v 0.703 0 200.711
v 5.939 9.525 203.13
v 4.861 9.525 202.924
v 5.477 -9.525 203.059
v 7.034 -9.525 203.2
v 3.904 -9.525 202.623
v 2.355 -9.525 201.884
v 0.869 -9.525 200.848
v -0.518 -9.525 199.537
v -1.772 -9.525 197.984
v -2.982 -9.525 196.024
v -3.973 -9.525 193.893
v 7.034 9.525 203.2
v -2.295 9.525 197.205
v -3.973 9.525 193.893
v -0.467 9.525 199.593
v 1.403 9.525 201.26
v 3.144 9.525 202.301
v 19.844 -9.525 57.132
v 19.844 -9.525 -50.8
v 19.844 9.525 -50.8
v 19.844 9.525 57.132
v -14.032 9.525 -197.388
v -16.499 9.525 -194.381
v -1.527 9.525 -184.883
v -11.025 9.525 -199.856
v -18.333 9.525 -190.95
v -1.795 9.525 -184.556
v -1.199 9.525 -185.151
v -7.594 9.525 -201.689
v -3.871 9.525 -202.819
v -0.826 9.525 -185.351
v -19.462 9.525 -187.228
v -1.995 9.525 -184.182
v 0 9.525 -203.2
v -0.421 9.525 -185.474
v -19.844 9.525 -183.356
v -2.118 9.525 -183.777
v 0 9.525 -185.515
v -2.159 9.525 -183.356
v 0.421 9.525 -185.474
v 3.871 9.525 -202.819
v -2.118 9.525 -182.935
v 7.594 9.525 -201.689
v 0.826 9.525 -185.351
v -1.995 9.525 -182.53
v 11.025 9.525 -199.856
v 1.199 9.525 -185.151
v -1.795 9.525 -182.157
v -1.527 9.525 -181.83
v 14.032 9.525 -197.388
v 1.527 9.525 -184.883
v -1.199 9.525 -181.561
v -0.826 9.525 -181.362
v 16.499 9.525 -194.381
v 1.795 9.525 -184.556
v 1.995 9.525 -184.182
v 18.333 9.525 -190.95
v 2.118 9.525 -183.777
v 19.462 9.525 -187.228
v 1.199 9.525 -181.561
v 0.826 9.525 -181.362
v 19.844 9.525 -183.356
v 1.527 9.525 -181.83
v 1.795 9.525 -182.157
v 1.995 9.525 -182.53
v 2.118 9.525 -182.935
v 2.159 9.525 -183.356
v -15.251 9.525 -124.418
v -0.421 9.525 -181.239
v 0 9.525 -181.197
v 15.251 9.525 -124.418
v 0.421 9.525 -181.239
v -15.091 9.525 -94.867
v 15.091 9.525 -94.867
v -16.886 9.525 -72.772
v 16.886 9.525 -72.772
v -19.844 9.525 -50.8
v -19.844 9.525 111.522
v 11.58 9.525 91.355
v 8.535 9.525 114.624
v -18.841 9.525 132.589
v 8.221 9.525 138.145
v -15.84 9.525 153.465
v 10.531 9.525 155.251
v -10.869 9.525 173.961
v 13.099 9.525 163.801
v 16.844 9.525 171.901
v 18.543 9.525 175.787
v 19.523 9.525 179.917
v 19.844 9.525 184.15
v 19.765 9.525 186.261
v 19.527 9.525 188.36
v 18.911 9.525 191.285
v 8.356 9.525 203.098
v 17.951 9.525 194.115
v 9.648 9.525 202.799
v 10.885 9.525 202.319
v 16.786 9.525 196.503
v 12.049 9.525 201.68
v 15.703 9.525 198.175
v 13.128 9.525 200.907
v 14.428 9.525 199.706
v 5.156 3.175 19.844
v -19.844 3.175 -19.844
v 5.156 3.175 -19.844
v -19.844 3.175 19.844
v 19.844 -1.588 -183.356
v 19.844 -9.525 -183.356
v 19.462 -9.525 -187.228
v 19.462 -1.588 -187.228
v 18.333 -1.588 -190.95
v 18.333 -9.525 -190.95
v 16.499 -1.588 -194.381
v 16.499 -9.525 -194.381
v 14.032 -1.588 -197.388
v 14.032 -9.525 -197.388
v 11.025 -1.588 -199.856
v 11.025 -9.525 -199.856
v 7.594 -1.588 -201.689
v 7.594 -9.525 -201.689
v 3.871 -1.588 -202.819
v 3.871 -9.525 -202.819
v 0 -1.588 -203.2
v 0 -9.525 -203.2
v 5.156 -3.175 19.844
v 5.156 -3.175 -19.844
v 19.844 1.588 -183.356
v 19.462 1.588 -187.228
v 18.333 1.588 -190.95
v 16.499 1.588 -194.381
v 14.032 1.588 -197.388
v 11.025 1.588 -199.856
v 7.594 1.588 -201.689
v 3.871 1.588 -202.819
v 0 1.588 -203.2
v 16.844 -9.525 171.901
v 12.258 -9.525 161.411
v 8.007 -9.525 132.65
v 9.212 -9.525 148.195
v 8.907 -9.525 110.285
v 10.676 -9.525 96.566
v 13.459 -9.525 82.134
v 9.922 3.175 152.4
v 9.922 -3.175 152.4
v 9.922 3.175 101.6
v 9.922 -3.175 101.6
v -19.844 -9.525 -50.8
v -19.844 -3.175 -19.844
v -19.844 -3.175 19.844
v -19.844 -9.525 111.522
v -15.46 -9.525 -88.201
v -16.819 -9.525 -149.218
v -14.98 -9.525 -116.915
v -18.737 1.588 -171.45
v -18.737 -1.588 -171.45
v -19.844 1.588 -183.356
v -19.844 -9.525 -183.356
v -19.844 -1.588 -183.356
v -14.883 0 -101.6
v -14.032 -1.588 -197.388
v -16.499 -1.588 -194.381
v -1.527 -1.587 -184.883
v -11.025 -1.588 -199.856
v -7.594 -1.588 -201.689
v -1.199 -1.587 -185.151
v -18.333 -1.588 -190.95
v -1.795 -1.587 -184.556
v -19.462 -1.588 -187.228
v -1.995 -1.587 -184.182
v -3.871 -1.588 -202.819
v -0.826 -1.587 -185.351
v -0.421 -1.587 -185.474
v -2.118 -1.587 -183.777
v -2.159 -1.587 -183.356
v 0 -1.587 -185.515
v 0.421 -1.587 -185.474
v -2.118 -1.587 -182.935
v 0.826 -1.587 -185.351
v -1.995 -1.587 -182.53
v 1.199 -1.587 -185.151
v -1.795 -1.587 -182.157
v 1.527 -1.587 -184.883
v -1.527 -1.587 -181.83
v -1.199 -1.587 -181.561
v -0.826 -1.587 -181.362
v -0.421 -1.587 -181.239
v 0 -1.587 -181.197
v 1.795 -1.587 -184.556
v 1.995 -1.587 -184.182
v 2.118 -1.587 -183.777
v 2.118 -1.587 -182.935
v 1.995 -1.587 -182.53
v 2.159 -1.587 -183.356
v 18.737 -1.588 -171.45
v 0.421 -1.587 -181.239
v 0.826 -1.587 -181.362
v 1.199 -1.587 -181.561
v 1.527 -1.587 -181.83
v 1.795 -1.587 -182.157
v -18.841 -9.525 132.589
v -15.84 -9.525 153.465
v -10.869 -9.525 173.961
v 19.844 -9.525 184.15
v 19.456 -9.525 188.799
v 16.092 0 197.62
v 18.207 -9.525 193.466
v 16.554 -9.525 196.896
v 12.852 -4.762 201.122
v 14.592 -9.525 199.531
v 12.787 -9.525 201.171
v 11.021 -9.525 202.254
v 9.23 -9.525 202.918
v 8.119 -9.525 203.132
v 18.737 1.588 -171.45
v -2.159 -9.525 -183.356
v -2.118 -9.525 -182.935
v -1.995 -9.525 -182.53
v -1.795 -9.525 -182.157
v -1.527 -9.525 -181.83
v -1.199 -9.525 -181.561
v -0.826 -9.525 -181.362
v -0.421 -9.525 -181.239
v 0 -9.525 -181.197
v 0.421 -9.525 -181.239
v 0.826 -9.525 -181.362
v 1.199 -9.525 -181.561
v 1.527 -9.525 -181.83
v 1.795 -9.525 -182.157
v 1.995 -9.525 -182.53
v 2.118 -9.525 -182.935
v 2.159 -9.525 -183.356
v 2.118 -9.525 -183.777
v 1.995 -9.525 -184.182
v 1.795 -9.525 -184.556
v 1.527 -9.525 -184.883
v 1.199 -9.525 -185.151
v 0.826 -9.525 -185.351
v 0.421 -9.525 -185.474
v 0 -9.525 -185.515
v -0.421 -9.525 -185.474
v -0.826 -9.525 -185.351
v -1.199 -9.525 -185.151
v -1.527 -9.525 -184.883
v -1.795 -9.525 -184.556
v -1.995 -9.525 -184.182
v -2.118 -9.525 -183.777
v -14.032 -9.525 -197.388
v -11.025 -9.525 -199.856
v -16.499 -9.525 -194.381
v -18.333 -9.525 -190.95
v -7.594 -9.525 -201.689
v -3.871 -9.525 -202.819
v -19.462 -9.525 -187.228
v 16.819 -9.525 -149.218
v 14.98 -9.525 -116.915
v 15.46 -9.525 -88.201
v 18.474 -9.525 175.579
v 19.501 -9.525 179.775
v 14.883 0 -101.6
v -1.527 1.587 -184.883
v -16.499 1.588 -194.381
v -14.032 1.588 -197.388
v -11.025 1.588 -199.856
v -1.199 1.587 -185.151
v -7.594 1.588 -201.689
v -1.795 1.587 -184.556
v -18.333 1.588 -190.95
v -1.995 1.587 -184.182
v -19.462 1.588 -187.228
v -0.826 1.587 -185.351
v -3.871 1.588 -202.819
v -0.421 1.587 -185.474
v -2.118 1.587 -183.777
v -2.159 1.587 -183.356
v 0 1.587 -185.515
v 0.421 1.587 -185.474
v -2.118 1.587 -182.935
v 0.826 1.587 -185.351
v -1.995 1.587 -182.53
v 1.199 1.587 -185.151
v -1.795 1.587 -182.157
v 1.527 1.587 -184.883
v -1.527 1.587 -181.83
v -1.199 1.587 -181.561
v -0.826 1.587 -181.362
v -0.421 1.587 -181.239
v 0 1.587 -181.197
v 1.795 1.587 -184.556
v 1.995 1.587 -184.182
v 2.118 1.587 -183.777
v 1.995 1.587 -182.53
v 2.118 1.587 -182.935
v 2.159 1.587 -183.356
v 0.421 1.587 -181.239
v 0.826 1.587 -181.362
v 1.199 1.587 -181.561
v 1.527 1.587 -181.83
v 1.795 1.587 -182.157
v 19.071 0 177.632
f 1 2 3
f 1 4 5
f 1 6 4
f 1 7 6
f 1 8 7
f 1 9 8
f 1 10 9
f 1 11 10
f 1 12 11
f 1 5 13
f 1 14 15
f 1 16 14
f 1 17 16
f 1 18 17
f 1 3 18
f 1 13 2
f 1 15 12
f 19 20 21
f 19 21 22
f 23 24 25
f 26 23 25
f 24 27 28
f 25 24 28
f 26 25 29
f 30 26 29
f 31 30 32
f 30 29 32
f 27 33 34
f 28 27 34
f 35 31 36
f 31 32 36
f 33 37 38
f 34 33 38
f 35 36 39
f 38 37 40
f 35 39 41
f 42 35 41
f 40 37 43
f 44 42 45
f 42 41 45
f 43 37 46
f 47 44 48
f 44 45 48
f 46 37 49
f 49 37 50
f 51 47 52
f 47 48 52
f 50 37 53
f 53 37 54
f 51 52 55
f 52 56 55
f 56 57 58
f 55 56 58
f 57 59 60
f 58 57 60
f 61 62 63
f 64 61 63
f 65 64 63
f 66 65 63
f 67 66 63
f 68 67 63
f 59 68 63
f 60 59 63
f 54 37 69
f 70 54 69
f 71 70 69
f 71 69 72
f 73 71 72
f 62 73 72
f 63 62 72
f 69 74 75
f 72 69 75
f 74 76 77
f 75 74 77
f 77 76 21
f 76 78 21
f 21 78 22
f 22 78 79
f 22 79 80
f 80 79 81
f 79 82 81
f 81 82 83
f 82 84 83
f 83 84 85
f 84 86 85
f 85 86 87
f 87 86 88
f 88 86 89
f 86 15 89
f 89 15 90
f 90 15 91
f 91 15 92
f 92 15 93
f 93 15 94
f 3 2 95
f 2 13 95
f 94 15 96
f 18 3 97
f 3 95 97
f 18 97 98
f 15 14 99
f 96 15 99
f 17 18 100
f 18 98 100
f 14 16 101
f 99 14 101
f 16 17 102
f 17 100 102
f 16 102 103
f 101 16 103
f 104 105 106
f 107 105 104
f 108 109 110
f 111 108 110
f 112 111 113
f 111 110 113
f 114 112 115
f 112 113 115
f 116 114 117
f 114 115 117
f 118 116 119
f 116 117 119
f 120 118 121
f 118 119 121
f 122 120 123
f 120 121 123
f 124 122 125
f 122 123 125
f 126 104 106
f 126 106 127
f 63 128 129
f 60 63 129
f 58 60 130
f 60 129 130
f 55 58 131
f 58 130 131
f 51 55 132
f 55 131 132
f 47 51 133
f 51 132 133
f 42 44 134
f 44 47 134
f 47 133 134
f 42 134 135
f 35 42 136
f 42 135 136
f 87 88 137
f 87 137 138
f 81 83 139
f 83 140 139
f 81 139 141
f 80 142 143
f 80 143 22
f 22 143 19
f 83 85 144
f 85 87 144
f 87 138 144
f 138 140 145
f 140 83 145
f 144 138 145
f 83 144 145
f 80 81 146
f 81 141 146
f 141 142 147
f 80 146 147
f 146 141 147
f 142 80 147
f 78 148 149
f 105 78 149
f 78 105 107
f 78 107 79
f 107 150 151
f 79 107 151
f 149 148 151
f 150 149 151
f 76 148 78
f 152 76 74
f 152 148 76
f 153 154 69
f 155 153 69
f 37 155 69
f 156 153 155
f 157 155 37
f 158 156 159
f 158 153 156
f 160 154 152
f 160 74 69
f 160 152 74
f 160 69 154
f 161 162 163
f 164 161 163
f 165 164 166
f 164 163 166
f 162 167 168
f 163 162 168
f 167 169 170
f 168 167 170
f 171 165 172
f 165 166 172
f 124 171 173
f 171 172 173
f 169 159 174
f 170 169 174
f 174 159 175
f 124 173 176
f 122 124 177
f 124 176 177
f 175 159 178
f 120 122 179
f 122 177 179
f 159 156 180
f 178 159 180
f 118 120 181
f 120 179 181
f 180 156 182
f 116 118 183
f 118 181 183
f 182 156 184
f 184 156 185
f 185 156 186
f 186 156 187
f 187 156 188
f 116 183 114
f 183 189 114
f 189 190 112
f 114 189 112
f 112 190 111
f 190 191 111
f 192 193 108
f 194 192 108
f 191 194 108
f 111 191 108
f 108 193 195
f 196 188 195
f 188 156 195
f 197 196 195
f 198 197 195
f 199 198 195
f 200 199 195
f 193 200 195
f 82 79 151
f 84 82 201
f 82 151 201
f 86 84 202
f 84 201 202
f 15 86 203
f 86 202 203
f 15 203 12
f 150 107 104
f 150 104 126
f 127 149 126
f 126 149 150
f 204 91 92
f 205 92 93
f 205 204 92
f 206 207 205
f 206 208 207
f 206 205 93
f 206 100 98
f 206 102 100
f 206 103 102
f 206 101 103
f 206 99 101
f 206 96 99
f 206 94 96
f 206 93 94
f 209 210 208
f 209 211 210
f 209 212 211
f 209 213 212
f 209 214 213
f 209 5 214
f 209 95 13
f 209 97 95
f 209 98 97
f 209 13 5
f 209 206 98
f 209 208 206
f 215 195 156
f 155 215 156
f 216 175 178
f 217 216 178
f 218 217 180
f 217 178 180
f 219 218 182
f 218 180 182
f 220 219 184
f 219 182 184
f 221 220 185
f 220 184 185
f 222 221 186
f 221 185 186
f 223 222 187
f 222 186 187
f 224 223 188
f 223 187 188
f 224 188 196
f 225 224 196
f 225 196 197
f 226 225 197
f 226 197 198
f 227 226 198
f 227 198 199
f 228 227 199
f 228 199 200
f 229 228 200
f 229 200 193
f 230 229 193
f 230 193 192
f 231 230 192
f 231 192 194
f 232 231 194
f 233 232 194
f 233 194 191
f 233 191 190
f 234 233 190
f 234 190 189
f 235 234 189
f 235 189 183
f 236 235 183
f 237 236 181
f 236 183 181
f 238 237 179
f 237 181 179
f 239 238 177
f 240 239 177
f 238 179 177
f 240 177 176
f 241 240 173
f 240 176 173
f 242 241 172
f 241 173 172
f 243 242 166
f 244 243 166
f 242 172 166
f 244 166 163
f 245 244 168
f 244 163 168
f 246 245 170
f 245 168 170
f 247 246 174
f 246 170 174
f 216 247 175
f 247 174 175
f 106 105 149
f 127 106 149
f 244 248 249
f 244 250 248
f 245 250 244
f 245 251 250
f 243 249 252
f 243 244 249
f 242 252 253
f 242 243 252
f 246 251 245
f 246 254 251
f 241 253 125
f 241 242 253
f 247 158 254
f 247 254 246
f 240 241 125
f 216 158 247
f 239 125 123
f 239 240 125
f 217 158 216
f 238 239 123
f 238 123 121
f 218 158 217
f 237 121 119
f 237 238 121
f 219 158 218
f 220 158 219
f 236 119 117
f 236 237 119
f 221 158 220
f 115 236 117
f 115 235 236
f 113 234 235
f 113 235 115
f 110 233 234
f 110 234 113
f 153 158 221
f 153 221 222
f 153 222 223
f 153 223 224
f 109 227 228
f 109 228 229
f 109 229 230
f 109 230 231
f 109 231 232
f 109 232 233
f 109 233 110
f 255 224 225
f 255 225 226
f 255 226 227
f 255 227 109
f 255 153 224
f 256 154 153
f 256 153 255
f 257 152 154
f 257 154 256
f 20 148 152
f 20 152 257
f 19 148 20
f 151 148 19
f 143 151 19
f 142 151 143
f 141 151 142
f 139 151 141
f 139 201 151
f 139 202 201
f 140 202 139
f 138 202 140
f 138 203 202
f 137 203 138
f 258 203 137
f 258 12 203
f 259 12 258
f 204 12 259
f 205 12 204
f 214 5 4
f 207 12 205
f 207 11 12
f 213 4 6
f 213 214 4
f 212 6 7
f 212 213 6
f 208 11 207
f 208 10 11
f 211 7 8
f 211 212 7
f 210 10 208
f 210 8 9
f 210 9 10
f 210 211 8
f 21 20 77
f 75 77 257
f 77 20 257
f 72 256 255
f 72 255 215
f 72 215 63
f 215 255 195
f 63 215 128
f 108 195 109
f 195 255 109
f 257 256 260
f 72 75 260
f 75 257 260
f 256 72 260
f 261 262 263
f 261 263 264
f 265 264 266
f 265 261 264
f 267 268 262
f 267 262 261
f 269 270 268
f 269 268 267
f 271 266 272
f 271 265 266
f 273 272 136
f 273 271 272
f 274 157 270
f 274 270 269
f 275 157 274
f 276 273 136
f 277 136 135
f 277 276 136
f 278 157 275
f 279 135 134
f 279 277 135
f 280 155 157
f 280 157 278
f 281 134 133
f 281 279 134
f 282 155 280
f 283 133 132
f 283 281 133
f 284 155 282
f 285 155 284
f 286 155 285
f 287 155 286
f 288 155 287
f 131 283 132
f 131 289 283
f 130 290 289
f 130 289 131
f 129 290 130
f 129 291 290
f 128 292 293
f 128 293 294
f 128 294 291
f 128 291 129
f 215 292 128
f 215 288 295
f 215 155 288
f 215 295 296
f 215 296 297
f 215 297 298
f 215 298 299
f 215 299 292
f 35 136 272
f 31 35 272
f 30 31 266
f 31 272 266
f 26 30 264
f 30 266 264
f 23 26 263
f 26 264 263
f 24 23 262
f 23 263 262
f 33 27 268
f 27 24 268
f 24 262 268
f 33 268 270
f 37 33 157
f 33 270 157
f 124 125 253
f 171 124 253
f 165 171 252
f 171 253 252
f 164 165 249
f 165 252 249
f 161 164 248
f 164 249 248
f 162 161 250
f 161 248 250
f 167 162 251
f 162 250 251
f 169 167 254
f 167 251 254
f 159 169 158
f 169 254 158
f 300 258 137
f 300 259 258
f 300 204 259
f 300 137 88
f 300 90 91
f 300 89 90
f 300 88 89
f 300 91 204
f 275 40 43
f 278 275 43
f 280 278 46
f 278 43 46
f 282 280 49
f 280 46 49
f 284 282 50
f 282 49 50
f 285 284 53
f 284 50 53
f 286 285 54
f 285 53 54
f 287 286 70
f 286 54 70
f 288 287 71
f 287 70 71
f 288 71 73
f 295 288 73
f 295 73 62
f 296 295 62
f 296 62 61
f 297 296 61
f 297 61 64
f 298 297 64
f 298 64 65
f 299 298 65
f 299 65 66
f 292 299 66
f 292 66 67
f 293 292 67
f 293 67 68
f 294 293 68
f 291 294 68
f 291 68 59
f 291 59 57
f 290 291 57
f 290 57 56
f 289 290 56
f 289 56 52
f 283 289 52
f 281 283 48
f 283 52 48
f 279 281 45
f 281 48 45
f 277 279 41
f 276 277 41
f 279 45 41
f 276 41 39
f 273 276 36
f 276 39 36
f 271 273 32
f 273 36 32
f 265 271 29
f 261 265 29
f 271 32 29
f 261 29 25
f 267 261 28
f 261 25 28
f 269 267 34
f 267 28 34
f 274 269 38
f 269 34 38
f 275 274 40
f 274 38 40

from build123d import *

# Parameters (mm, degrees)
F0_W     = 39.6875
F0_H     = 406.4
F1_DEPTH = 9.525
F2_W     = 6.35
F2_H     = 39.6875
F3_DEPTH = 25
F5_DEPTH = 19.051
F7_DEPTH = 1.5875
F9_D     = 4.318


with BuildPart() as f1:
    # F0 (on Front) → F1 (new body, symmetric)
    with BuildSketch(Plane.XZ):
        Rectangle(F0_W, F0_H)
    extrude(amount=F1_DEPTH, both=True)

    # F2 (on face) → F3 (cut)
    with BuildSketch(Plane(origin=(-19.84375, 0, 0), x_dir=(0, -1, 0), z_dir=(-1, 0, 0))):
        Rectangle(F2_W, F2_H)
    extrude(amount=-F3_DEPTH, mode=Mode.SUBTRACT)

    # F4 (on face) → F5 (cut, through all)
    with BuildSketch(Plane.XZ.offset(9.525)):
        with BuildLine():
            Line((7.0341385432, 203.2), (-19.84375, 203.2))
            Line((-19.84375, 203.2), (-19.84375, 111.521875))
            ThreePointArc((-19.84375, 111.521875), (-15.8400316853, 153.4647609056), (-3.9734854925, 193.8927279568))
            add(Edge.make_bspline(
                [(7.0341385432, 203.2), (-0.2487850546, 203.2), (-3.9734854925, 193.8927279568)],
                knots=[0, 0, 0, 1.0339490894, 1.0339490894, 1.0339490894], degree=2, weights=[1, 0.8693184943, 1]))
        make_face()
        with BuildLine():
            Line((19.84375, 203.2), (7.0341385432, 203.2))
            add(Edge.make_bspline(
                [(19.84375, 184.1499997199), (19.8437501883, 203.2), (7.0341385432, 203.2)],
                knots=[4.7123889657, 4.7123889657, 4.7123889657, 6.2831853072, 6.2831853072, 6.2831853072], degree=2, weights=[1, 0.707106776, 1]))
            Line((19.84375, 184.1499997199), (19.84375, 203.2))
        make_face()
        with BuildLine():
            Line((19.84375, 176.5695613803), (19.84375, 184.1499997199))
            add(Edge.make_bspline(
                [(16.84439979, 171.9005189458), (19.8437499314, 177.2131309179), (19.84375, 184.1499997199)],
                knots=[4.0139573004, 4.0139573004, 4.0139573004, 4.7123889657, 4.7123889657, 4.7123889657], degree=2, weights=[1, 0.9396413133, 1]))
            add(Edge.make_bspline(
                [(19.84375, 176.5695613803), (18.8065478073, 175.1509160959), (17.8010548966, 173.5949984606), (16.84439979, 171.9005189458)],
                knots=[0, 0, 0, 0, 0.0662671427, 0.0662671427, 0.0662671427, 0.0662671427], degree=3))
        make_face()
        with BuildLine():
            add(Edge.make_bspline(
                [(19.84375, 176.5695613803), (18.8065478073, 175.1509160959), (17.8010548966, 173.5949984606), (16.84439979, 171.9005189458)],
                knots=[0, 0, 0, 0, 0.0662671427, 0.0662671427, 0.0662671427, 0.0662671427], degree=3))
            add(Edge.make_bspline(
                [(16.84439979, 171.9005189458), (13.9150462786, 166.7118888088), (6.871998352, 148.2229851045), (7.9533512774, 100.8460076909), (16.1750007742, 70.447095167), (19.84375, 57.1321291334)],
                knots=[0.0662671427, 0.0662671427, 0.0662671427, 0.0662671427, 0.2691823685, 0.6445312257, 1, 1, 1, 1], degree=3))
            Line((19.84375, 57.1321291334), (19.84375, 176.5695613803))
        make_face()
        with BuildLine():
            add(Edge.make_bspline(
                [(-19.84375, -50.8), (-17.5374013822, -66.7231403213), (-12.3094439018, -102.8172091965), (-17.1427124069, -154.4831051715), (-19.84375, -183.35625)],
                knots=[0, 0, 0, 0, 0.4411567231, 1, 1, 1, 1], degree=3))
            Line((-19.84375, -50.8), (-19.84375, -183.35625))
        make_face()
        with BuildLine():
            ThreePointArc((0, -203.2), (-14.0316501892, -197.3879001892), (-19.84375, -183.35625))
            Line((-19.84375, -183.35625), (-19.84375, -203.2))
            Line((-19.84375, -203.2), (0, -203.2))
        make_face()
        with BuildLine():
            Line((19.84375, -183.35625), (19.84375, -50.8))
            add(Edge.make_bspline(
                [(19.84375, -50.8), (17.5374013822, -66.7231403213), (12.3094439018, -102.8172091965), (17.1427124069, -154.4831051715), (19.84375, -183.35625)],
                knots=[0, 0, 0, 0, 0.4411567231, 1, 1, 1, 1], degree=3))
        make_face()
        with BuildLine():
            ThreePointArc((19.84375, -183.35625), (14.0316501892, -197.3879001892), (0, -203.2))
            Line((0, -203.2), (19.84375, -203.2))
            Line((19.84375, -203.2), (19.84375, -183.35625))
        make_face()
    extrude(amount=-F5_DEPTH, mode=Mode.SUBTRACT)

    # F6 (on Front) → F7 (cut, symmetric)
    with BuildSketch(Plane.XZ):
        with BuildLine():
            Line((15.875, -171.45), (-15.875, -171.45))
            ThreePointArc((-15.875, -171.45), (-18.8254341957, -177.0811052681), (-19.84375, -183.35625))
            ThreePointArc((-19.84375, -183.35625), (-14.0316501892, -197.3879001892), (0, -203.2))
            ThreePointArc((0, -203.2), (14.0316501892, -197.3879001892), (19.84375, -183.35625))
            ThreePointArc((19.84375, -183.35625), (18.8254341957, -177.0811052681), (15.875, -171.45))
        make_face()
        with BuildLine():
            ThreePointArc((-19.84375, -183.35625), (-18.8254341957, -177.0811052681), (-15.875, -171.45))
            Line((-15.875, -171.45), (-19.84375, -171.45))
            Line((-19.84375, -171.45), (-19.84375, -183.35625))
        make_face()
        with BuildLine():
            ThreePointArc((0, -203.2), (-14.0316501892, -197.3879001892), (-19.84375, -183.35625))
            Line((-19.84375, -183.35625), (-19.84375, -203.2))
            Line((-19.84375, -203.2), (0, -203.2))
        make_face()
        with BuildLine():
            Line((19.84375, -171.45), (15.875, -171.45))
            ThreePointArc((15.875, -171.45), (18.8254341957, -177.0811052681), (19.84375, -183.35625))
            Line((19.84375, -183.35625), (19.84375, -171.45))
        make_face()
        with BuildLine():
            ThreePointArc((19.84375, -183.35625), (14.0316501892, -197.3879001892), (0, -203.2))
            Line((0, -203.2), (19.84375, -203.2))
            Line((19.84375, -203.2), (19.84375, -183.35625))
        make_face()
    extrude(amount=F7_DEPTH, both=True, mode=Mode.SUBTRACT)

    # F9 (through all)
    with Locations(Plane.XZ.offset(9.525)):
        with Locations((0, -183.35625)):
            Hole(F9_D / 2)


solid = f1.part
